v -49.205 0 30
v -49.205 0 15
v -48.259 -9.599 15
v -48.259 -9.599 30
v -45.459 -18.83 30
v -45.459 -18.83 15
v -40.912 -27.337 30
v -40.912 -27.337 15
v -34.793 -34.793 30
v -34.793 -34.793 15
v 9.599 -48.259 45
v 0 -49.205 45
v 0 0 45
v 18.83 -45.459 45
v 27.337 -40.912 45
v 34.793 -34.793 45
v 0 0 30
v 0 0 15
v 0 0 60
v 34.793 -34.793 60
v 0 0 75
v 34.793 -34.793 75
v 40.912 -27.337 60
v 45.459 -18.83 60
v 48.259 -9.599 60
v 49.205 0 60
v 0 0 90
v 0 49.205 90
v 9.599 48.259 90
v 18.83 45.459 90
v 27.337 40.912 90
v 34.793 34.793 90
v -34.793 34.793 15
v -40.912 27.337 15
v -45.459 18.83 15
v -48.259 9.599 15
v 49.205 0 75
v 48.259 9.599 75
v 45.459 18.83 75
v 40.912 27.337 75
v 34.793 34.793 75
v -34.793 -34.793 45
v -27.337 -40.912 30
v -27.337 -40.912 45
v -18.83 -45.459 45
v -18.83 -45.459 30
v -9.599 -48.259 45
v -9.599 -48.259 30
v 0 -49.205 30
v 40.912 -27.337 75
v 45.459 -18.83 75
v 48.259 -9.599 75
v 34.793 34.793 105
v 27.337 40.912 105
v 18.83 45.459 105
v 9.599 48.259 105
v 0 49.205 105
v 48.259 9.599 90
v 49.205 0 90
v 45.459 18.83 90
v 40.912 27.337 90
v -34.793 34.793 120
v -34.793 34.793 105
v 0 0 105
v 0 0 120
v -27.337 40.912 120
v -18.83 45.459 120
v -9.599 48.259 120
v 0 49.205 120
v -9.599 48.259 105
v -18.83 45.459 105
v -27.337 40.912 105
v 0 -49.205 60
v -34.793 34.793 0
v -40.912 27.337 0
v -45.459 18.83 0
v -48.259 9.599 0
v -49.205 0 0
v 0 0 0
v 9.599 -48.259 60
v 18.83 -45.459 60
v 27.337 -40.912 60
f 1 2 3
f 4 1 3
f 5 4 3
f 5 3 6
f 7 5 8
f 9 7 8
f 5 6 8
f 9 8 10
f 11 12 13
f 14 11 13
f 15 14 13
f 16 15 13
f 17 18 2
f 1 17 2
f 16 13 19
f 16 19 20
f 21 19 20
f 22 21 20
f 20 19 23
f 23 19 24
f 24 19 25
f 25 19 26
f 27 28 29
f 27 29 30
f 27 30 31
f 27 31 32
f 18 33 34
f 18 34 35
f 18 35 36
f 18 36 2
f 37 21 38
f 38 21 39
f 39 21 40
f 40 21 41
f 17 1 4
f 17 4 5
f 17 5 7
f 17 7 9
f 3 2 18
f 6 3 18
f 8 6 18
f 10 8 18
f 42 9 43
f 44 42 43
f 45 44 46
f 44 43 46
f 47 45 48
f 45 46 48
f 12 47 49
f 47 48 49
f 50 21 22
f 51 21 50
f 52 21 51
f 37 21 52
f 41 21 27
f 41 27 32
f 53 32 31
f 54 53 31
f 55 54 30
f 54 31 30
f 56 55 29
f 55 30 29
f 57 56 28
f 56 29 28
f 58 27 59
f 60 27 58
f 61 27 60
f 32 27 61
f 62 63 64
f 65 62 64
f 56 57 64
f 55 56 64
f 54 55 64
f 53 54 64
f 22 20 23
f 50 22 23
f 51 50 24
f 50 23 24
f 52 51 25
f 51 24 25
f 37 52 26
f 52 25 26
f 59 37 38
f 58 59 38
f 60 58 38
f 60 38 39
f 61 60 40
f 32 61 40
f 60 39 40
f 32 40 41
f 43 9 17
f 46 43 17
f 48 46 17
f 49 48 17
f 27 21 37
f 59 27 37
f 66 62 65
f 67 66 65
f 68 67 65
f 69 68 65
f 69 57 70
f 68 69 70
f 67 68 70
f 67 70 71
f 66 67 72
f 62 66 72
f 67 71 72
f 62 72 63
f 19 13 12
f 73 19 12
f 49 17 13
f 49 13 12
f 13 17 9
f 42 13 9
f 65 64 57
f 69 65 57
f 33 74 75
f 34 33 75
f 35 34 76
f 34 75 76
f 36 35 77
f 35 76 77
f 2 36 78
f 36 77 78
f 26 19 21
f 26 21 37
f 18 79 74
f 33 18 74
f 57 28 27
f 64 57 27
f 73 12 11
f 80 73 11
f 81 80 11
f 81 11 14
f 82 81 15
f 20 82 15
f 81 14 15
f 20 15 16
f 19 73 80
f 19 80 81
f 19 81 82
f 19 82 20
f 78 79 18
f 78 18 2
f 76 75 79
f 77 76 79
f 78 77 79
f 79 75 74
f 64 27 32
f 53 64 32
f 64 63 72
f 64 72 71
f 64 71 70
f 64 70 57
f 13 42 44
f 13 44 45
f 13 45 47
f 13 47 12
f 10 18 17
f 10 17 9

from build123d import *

# Parameters (mm, degrees)
F1_DEPTH  = 15
F2_DEPTH  = 30
F3_DEPTH  = 45
F4_DEPTH  = 60
F5_DEPTH  = 75
F6_DEPTH  = 90
F7_DEPTH  = 15
F8_DEPTH  = 30
F9_DEPTH  = 45
F10_DEPTH = 60
F11_DEPTH = 75
F12_DEPTH = 105
F13_DEPTH = 120
F14_DEPTH = 90
F15_DEPTH = 105


with BuildPart() as f1:
    # F0 (on Top) → F1 (new body)
    with BuildSketch(Plane.XY):
        Polygon((-49.2046483293, 0), (0, 0), (-24.6023241646, 24.6023241646), align=None)
        with BuildLine():
            ThreePointArc((-34.7929404995, 34.7929404995), (-45.4591674959, 18.829803711), (-49.2046483293, 0))
            Line((-49.2046483293, 0), (-24.6023241646, 24.6023241646))
            Line((-24.6023241646, 24.6023241646), (-34.7929404995, 34.7929404995))
        make_face()
    extrude(amount=F1_DEPTH)

    # F0 (on Top) → F2 (join)
    with BuildSketch(Plane.XY):
        Polygon((-24.6023241646, -24.6023241646), (0, 0), (-49.2046483293, 0), align=None)
        with BuildLine():
            Line((-24.6023241646, -24.6023241646), (-49.2046483293, 0))
            ThreePointArc((-49.2046483293, 0), (-45.4591674959, -18.829803711), (-34.7929404995, -34.7929404995))
            Line((-34.7929404995, -34.7929404995), (-24.6023241646, -24.6023241646))
        make_face()
    extrude(amount=F2_DEPTH)

    # F0 (on Top) → F3 (join)
    with BuildSketch(Plane.XY):
        Polygon((0, -49.2046483293), (0, 0), (-24.6023241646, -24.6023241646), align=None)
        with BuildLine():
            ThreePointArc((-34.7929404995, -34.7929404995), (-18.829803711, -45.4591674959), (0, -49.2046483293))
            Line((0, -49.2046483293), (-24.6023241646, -24.6023241646))
            Line((-24.6023241646, -24.6023241646), (-34.7929404995, -34.7929404995))
        make_face()
    extrude(amount=F3_DEPTH)

    # F0 (on Top) → F4 (join)
    with BuildSketch(Plane.XY):
        Polygon((24.6023241646, -24.6023241646), (0, 0), (0, -49.2046483293), align=None)
        with BuildLine():
            ThreePointArc((0, -49.2046483293), (18.829803711, -45.4591674959), (34.7929404995, -34.7929404995))
            Line((34.7929404995, -34.7929404995), (24.6023241646, -24.6023241646))
            Line((24.6023241646, -24.6023241646), (0, -49.2046483293))
        make_face()
    extrude(amount=F4_DEPTH)

    # F0 (on Top) → F5 (join)
    with BuildSketch(Plane.XY):
        Polygon((24.6023241646, -24.6023241646), (49.2046483293, 0), (0, 0), align=None)
        with BuildLine():
            ThreePointArc((34.7929404995, -34.7929404995), (45.4591674959, -18.829803711), (49.2046483293, 0))
            Line((49.2046483293, 0), (24.6023241646, -24.6023241646))
            Line((24.6023241646, -24.6023241646), (34.7929404995, -34.7929404995))
        make_face()
    extrude(amount=F5_DEPTH)

    # F0 (on Top) → F6 (join)
    with BuildSketch(Plane.XY):
        Polygon((0, 0), (49.2046483293, 0), (24.6023241646, 24.6023241646), align=None)
        with BuildLine():
            Line((24.6023241646, 24.6023241646), (49.2046483293, 0))
            ThreePointArc((49.2046483293, 0), (45.4591674959, 18.829803711), (34.7929404995, 34.7929404995))
            Line((34.7929404995, 34.7929404995), (24.6023241646, 24.6023241646))
        make_face()
    extrude(amount=F6_DEPTH)

    # F0 (on Top) → F7 (cut)
    with BuildSketch(Plane.XY):
        Polygon((-24.6023241646, -24.6023241646), (0, 0), (-49.2046483293, 0), align=None)
        with BuildLine():
            Line((-24.6023241646, -24.6023241646), (-49.2046483293, 0))
            ThreePointArc((-49.2046483293, 0), (-45.4591674959, -18.829803711), (-34.7929404995, -34.7929404995))
            Line((-34.7929404995, -34.7929404995), (-24.6023241646, -24.6023241646))
        make_face()
    extrude(amount=F7_DEPTH, mode=Mode.SUBTRACT)

    # F0 (on Top) → F8 (cut)
    with BuildSketch(Plane.XY):
        Polygon((0, -49.2046483293), (0, 0), (-24.6023241646, -24.6023241646), align=None)
        with BuildLine():
            ThreePointArc((-34.7929404995, -34.7929404995), (-18.829803711, -45.4591674959), (0, -49.2046483293))
            Line((0, -49.2046483293), (-24.6023241646, -24.6023241646))
            Line((-24.6023241646, -24.6023241646), (-34.7929404995, -34.7929404995))
        make_face()
    extrude(amount=F8_DEPTH, mode=Mode.SUBTRACT)

    # F0 (on Top) → F9 (cut)
    with BuildSketch(Plane.XY):
        Polygon((24.6023241646, -24.6023241646), (0, 0), (0, -49.2046483293), align=None)
        with BuildLine():
            ThreePointArc((0, -49.2046483293), (18.829803711, -45.4591674959), (34.7929404995, -34.7929404995))
            Line((34.7929404995, -34.7929404995), (24.6023241646, -24.6023241646))
            Line((24.6023241646, -24.6023241646), (0, -49.2046483293))
        make_face()
    extrude(amount=F9_DEPTH, mode=Mode.SUBTRACT)

    # F0 (on Top) → F10 (cut)
    with BuildSketch(Plane.XY):
        Polygon((24.6023241646, -24.6023241646), (49.2046483293, 0), (0, 0), align=None)
        with BuildLine():
            ThreePointArc((34.7929404995, -34.7929404995), (45.4591674959, -18.829803711), (49.2046483293, 0))
            Line((49.2046483293, 0), (24.6023241646, -24.6023241646))
            Line((24.6023241646, -24.6023241646), (34.7929404995, -34.7929404995))
        make_face()
    extrude(amount=F10_DEPTH, mode=Mode.SUBTRACT)

    # F0 (on Top) → F11 (cut)
    with BuildSketch(Plane.XY):
        Polygon((0, 0), (49.2046483293, 0), (24.6023241646, 24.6023241646), align=None)
        with BuildLine():
            Line((24.6023241646, 24.6023241646), (49.2046483293, 0))
            ThreePointArc((49.2046483293, 0), (45.4591674959, 18.829803711), (34.7929404995, 34.7929404995))
            Line((34.7929404995, 34.7929404995), (24.6023241646, 24.6023241646))
        make_face()
    extrude(amount=F11_DEPTH, mode=Mode.SUBTRACT)

    # F0 (on Top) → F12 (join)
    with BuildSketch(Plane.XY):
        Polygon((0, 49.2046483293), (0, 0), (24.6023241646, 24.6023241646), align=None)
        with BuildLine():
            Line((24.6023241646, 24.6023241646), (34.7929404995, 34.7929404995))
            ThreePointArc((34.7929404995, 34.7929404995), (18.829803711, 45.4591674959), (0, 49.2046483293))
            Line((0, 49.2046483293), (24.6023241646, 24.6023241646))
        make_face()
    extrude(amount=F12_DEPTH)

    # F0 (on Top) → F14 (cut)
    with BuildSketch(Plane.XY):
        Polygon((0, 49.2046483293), (0, 0), (24.6023241646, 24.6023241646), align=None)
        with BuildLine():
            Line((24.6023241646, 24.6023241646), (34.7929404995, 34.7929404995))
            ThreePointArc((34.7929404995, 34.7929404995), (18.829803711, 45.4591674959), (0, 49.2046483293))
            Line((0, 49.2046483293), (24.6023241646, 24.6023241646))
        make_face()
    extrude(amount=F14_DEPTH, mode=Mode.SUBTRACT)


with BuildPart() as f13:
    # F0 (on Top) → F13 (new body)
    with BuildSketch(Plane.XY):
        with BuildLine():
            Line((-24.6023241646, 24.6023241646), (0, 49.2046483293))
            ThreePointArc((0, 49.2046483293), (-18.829803711, 45.4591674959), (-34.7929404995, 34.7929404995))
            Line((-34.7929404995, 34.7929404995), (-24.6023241646, 24.6023241646))
        make_face()
        Polygon((-24.6023241646, 24.6023241646), (0, 0), (0, 49.2046483293), align=None)
    extrude(amount=F13_DEPTH)

    # F0 (on Top) → F15 (cut)
    with BuildSketch(Plane.XY):
        Polygon((-24.6023241646, 24.6023241646), (0, 0), (0, 49.2046483293), align=None)
        with BuildLine():
            Line((-24.6023241646, 24.6023241646), (0, 49.2046483293))
            ThreePointArc((0, 49.2046483293), (-18.829803711, 45.4591674959), (-34.7929404995, 34.7929404995))
            Line((-34.7929404995, 34.7929404995), (-24.6023241646, 24.6023241646))
        make_face()
    extrude(amount=F15_DEPTH, mode=Mode.SUBTRACT)


solid = Compound([f1.part, f13.part])
